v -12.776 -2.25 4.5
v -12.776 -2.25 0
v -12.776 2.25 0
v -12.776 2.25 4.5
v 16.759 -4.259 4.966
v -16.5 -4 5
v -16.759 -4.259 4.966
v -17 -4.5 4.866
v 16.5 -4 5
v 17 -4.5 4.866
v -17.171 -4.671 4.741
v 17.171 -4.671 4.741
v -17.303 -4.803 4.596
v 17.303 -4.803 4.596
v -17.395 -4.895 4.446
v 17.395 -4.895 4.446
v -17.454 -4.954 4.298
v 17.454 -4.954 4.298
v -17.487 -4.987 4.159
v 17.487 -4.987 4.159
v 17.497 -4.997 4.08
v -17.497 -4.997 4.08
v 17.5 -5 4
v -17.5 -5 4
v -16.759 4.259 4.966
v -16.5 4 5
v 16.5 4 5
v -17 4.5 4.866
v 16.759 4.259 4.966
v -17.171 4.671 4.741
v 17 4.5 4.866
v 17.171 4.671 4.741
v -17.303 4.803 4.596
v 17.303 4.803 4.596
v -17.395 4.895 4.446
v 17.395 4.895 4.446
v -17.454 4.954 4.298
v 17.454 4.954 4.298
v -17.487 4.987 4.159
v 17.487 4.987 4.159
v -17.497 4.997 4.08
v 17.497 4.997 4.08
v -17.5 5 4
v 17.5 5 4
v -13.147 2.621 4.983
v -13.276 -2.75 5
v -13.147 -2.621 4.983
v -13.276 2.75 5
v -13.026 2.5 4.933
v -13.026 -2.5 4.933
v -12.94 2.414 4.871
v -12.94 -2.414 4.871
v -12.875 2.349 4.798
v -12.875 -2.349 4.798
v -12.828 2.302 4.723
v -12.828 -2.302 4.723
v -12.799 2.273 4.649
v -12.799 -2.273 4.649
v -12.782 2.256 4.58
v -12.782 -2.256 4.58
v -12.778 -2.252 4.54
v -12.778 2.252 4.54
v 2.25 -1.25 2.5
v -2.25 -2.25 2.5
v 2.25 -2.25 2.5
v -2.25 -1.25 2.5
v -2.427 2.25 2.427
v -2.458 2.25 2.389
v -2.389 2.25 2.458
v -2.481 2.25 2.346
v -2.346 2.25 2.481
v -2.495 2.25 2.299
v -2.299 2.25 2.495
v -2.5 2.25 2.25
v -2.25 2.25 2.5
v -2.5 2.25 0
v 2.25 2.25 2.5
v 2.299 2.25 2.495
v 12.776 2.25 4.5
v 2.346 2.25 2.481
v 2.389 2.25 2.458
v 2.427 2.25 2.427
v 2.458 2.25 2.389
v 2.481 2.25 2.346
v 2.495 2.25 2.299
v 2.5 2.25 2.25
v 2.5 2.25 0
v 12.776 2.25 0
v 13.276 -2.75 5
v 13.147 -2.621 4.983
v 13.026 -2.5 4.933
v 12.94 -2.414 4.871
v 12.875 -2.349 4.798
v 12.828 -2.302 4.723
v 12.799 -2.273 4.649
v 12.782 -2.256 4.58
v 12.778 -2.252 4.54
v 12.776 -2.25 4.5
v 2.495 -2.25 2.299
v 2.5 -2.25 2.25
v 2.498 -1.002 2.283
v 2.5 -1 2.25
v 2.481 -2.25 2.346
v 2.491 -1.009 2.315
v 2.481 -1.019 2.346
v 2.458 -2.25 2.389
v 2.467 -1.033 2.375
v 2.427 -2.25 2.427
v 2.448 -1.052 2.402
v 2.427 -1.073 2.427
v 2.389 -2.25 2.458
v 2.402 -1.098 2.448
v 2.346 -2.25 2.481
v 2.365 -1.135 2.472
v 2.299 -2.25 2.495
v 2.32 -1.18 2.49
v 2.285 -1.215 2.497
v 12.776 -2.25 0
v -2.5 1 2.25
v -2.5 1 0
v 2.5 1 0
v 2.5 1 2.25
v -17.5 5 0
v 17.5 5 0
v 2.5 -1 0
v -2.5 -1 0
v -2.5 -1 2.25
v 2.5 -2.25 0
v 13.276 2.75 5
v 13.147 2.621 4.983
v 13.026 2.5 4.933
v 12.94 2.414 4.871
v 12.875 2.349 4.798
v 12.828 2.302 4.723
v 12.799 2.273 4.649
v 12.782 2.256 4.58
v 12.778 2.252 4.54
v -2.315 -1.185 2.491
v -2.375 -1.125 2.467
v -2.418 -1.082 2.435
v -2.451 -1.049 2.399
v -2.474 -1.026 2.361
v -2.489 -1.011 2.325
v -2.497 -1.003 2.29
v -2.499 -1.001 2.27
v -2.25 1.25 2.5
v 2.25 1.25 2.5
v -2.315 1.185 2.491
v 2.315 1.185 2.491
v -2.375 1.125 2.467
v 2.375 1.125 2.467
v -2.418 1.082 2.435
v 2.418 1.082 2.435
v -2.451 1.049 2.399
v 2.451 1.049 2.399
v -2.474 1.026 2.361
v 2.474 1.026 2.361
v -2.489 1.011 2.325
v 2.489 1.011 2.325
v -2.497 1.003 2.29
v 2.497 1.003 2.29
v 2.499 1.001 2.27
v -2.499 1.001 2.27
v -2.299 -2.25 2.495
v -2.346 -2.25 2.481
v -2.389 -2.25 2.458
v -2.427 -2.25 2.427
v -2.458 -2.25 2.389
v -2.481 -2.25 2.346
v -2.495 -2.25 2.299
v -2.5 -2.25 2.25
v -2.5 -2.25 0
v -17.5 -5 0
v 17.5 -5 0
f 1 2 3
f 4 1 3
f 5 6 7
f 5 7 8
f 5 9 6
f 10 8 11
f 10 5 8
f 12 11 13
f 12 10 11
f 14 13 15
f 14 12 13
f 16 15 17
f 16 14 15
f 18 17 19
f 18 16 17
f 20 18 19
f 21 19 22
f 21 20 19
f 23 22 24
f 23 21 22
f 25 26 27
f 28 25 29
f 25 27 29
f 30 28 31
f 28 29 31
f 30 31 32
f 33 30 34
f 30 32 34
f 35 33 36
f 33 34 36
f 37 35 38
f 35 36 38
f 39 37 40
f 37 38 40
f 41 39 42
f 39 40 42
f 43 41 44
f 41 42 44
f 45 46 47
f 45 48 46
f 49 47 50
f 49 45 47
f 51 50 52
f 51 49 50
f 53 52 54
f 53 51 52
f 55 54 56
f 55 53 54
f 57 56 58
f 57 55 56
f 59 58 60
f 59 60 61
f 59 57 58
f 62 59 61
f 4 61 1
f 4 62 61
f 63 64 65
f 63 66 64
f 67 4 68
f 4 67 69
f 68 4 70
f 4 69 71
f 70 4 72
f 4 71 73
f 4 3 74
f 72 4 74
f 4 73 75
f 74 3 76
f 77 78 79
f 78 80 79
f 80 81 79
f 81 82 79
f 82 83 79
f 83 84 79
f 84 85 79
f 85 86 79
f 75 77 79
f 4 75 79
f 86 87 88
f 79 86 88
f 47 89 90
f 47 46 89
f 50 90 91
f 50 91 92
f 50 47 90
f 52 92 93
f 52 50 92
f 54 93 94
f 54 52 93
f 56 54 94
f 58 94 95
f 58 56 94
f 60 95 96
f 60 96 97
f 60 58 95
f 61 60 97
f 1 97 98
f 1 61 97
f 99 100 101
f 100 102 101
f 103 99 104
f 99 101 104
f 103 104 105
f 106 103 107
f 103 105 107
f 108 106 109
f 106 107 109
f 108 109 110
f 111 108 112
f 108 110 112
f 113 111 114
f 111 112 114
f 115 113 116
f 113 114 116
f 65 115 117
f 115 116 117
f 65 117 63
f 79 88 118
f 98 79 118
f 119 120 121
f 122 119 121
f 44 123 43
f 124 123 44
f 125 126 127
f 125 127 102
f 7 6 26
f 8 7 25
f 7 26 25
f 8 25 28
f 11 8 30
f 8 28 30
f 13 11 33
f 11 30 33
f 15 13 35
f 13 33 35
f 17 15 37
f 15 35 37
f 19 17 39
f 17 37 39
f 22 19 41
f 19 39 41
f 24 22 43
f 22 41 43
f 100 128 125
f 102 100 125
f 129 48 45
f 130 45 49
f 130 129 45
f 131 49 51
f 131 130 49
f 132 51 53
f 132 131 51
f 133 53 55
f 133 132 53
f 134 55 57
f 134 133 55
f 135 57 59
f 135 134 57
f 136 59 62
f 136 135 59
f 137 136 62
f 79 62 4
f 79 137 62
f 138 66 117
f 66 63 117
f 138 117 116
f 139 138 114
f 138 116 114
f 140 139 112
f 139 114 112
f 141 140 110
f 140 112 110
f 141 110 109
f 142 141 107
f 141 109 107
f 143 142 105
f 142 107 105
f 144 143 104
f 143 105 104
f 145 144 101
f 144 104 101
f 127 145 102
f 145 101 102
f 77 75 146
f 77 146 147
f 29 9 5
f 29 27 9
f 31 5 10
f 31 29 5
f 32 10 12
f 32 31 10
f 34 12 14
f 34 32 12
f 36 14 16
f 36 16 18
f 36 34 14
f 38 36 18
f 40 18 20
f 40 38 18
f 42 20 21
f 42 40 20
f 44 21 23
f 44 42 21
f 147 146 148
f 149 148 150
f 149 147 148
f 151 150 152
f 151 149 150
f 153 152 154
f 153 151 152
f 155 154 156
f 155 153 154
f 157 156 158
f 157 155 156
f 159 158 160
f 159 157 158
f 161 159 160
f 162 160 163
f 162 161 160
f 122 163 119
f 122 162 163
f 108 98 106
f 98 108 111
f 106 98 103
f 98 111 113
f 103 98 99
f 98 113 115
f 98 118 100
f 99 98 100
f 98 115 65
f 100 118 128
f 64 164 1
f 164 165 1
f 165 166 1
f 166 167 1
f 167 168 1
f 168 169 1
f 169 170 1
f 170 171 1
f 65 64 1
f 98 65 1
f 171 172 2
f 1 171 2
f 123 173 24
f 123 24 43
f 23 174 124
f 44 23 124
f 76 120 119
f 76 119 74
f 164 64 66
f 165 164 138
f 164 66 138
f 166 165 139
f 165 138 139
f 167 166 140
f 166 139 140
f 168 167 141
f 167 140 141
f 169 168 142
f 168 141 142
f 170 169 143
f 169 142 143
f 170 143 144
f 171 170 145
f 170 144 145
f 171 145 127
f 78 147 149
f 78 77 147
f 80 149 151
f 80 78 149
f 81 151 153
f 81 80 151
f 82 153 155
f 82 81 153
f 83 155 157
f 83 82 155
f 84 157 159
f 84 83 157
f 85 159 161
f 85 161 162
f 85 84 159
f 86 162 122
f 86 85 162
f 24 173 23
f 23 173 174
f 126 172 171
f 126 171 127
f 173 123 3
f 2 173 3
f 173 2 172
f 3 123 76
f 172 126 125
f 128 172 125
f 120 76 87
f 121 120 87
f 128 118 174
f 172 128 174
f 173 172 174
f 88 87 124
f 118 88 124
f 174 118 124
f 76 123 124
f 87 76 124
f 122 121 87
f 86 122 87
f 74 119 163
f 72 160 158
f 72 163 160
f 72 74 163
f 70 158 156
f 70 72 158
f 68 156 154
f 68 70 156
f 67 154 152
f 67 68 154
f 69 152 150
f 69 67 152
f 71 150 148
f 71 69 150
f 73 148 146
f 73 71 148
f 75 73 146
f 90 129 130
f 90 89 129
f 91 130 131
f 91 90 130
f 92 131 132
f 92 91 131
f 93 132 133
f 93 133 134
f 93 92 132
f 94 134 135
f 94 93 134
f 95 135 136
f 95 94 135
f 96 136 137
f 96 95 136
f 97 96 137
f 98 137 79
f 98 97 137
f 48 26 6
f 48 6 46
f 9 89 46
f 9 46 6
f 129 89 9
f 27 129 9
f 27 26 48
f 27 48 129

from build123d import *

# Parameters (mm, degrees)
F0_W     = 35
F0_H     = 10
F2_DEPTH = 5
F0_W_2   = 5
F0_H_2   = 1.25
F3_DEPTH = 2.5
F4_R     = 0.25
F5_R     = 1
F6_R     = 0.5


with BuildPart() as f2:
    # F0 (on Top) → F2 (new body)
    with BuildSketch(Plane.XY):
        Rectangle(F0_W, F0_H)
        Polygon((-12.776, -2.25), (-12.776, 2.25), (-2.5, 2.25), (2.5, 2.25), (12.776, 2.25), (12.776, -2.25), (2.5, -2.25), (-2.5, -2.25), align=None, mode=Mode.SUBTRACT)
    extrude(amount=F2_DEPTH)

    # F0 (on Top) → F3 (join)
    with BuildSketch(Plane.XY):
        with Locations((0, 1.625)):
            Rectangle(F0_W_2, F0_H_2)
        with Locations((0, -1.625)):
            Rectangle(F0_W_2, F0_H_2)
    extrude(amount=F3_DEPTH)

    # F4
    f4_edges = [f2.edges().sort_by_distance(p)[0] for p in [
        (2.5, 1.625, 2.5),
        (0, 1, 2.5),
        (-2.5, 1.625, 2.5),
        (2.5, -1.625, 2.5),
        (-2.5, -1.625, 2.5),
        (0, -1, 2.5),
    ]]
    fillet(f4_edges, radius=F4_R)

    # F5
    f5_edges = [f2.edges().sort_by_distance(p)[0] for p in [
        (0, -5, 5),
        (0, 5, 5),
        (17.5, 0, 5),
        (-17.5, 0, 5),
    ]]
    fillet(f5_edges, radius=F5_R)

    # F6
    f6_edges = [f2.edges().sort_by_distance(p)[0] for p in [
        (0, 2.25, 5),
        (12.776, 0, 5),
        (0, -2.25, 5),
        (-12.776, 0, 5),
    ]]
    fillet(f6_edges, radius=F6_R)


solid = f2.part
